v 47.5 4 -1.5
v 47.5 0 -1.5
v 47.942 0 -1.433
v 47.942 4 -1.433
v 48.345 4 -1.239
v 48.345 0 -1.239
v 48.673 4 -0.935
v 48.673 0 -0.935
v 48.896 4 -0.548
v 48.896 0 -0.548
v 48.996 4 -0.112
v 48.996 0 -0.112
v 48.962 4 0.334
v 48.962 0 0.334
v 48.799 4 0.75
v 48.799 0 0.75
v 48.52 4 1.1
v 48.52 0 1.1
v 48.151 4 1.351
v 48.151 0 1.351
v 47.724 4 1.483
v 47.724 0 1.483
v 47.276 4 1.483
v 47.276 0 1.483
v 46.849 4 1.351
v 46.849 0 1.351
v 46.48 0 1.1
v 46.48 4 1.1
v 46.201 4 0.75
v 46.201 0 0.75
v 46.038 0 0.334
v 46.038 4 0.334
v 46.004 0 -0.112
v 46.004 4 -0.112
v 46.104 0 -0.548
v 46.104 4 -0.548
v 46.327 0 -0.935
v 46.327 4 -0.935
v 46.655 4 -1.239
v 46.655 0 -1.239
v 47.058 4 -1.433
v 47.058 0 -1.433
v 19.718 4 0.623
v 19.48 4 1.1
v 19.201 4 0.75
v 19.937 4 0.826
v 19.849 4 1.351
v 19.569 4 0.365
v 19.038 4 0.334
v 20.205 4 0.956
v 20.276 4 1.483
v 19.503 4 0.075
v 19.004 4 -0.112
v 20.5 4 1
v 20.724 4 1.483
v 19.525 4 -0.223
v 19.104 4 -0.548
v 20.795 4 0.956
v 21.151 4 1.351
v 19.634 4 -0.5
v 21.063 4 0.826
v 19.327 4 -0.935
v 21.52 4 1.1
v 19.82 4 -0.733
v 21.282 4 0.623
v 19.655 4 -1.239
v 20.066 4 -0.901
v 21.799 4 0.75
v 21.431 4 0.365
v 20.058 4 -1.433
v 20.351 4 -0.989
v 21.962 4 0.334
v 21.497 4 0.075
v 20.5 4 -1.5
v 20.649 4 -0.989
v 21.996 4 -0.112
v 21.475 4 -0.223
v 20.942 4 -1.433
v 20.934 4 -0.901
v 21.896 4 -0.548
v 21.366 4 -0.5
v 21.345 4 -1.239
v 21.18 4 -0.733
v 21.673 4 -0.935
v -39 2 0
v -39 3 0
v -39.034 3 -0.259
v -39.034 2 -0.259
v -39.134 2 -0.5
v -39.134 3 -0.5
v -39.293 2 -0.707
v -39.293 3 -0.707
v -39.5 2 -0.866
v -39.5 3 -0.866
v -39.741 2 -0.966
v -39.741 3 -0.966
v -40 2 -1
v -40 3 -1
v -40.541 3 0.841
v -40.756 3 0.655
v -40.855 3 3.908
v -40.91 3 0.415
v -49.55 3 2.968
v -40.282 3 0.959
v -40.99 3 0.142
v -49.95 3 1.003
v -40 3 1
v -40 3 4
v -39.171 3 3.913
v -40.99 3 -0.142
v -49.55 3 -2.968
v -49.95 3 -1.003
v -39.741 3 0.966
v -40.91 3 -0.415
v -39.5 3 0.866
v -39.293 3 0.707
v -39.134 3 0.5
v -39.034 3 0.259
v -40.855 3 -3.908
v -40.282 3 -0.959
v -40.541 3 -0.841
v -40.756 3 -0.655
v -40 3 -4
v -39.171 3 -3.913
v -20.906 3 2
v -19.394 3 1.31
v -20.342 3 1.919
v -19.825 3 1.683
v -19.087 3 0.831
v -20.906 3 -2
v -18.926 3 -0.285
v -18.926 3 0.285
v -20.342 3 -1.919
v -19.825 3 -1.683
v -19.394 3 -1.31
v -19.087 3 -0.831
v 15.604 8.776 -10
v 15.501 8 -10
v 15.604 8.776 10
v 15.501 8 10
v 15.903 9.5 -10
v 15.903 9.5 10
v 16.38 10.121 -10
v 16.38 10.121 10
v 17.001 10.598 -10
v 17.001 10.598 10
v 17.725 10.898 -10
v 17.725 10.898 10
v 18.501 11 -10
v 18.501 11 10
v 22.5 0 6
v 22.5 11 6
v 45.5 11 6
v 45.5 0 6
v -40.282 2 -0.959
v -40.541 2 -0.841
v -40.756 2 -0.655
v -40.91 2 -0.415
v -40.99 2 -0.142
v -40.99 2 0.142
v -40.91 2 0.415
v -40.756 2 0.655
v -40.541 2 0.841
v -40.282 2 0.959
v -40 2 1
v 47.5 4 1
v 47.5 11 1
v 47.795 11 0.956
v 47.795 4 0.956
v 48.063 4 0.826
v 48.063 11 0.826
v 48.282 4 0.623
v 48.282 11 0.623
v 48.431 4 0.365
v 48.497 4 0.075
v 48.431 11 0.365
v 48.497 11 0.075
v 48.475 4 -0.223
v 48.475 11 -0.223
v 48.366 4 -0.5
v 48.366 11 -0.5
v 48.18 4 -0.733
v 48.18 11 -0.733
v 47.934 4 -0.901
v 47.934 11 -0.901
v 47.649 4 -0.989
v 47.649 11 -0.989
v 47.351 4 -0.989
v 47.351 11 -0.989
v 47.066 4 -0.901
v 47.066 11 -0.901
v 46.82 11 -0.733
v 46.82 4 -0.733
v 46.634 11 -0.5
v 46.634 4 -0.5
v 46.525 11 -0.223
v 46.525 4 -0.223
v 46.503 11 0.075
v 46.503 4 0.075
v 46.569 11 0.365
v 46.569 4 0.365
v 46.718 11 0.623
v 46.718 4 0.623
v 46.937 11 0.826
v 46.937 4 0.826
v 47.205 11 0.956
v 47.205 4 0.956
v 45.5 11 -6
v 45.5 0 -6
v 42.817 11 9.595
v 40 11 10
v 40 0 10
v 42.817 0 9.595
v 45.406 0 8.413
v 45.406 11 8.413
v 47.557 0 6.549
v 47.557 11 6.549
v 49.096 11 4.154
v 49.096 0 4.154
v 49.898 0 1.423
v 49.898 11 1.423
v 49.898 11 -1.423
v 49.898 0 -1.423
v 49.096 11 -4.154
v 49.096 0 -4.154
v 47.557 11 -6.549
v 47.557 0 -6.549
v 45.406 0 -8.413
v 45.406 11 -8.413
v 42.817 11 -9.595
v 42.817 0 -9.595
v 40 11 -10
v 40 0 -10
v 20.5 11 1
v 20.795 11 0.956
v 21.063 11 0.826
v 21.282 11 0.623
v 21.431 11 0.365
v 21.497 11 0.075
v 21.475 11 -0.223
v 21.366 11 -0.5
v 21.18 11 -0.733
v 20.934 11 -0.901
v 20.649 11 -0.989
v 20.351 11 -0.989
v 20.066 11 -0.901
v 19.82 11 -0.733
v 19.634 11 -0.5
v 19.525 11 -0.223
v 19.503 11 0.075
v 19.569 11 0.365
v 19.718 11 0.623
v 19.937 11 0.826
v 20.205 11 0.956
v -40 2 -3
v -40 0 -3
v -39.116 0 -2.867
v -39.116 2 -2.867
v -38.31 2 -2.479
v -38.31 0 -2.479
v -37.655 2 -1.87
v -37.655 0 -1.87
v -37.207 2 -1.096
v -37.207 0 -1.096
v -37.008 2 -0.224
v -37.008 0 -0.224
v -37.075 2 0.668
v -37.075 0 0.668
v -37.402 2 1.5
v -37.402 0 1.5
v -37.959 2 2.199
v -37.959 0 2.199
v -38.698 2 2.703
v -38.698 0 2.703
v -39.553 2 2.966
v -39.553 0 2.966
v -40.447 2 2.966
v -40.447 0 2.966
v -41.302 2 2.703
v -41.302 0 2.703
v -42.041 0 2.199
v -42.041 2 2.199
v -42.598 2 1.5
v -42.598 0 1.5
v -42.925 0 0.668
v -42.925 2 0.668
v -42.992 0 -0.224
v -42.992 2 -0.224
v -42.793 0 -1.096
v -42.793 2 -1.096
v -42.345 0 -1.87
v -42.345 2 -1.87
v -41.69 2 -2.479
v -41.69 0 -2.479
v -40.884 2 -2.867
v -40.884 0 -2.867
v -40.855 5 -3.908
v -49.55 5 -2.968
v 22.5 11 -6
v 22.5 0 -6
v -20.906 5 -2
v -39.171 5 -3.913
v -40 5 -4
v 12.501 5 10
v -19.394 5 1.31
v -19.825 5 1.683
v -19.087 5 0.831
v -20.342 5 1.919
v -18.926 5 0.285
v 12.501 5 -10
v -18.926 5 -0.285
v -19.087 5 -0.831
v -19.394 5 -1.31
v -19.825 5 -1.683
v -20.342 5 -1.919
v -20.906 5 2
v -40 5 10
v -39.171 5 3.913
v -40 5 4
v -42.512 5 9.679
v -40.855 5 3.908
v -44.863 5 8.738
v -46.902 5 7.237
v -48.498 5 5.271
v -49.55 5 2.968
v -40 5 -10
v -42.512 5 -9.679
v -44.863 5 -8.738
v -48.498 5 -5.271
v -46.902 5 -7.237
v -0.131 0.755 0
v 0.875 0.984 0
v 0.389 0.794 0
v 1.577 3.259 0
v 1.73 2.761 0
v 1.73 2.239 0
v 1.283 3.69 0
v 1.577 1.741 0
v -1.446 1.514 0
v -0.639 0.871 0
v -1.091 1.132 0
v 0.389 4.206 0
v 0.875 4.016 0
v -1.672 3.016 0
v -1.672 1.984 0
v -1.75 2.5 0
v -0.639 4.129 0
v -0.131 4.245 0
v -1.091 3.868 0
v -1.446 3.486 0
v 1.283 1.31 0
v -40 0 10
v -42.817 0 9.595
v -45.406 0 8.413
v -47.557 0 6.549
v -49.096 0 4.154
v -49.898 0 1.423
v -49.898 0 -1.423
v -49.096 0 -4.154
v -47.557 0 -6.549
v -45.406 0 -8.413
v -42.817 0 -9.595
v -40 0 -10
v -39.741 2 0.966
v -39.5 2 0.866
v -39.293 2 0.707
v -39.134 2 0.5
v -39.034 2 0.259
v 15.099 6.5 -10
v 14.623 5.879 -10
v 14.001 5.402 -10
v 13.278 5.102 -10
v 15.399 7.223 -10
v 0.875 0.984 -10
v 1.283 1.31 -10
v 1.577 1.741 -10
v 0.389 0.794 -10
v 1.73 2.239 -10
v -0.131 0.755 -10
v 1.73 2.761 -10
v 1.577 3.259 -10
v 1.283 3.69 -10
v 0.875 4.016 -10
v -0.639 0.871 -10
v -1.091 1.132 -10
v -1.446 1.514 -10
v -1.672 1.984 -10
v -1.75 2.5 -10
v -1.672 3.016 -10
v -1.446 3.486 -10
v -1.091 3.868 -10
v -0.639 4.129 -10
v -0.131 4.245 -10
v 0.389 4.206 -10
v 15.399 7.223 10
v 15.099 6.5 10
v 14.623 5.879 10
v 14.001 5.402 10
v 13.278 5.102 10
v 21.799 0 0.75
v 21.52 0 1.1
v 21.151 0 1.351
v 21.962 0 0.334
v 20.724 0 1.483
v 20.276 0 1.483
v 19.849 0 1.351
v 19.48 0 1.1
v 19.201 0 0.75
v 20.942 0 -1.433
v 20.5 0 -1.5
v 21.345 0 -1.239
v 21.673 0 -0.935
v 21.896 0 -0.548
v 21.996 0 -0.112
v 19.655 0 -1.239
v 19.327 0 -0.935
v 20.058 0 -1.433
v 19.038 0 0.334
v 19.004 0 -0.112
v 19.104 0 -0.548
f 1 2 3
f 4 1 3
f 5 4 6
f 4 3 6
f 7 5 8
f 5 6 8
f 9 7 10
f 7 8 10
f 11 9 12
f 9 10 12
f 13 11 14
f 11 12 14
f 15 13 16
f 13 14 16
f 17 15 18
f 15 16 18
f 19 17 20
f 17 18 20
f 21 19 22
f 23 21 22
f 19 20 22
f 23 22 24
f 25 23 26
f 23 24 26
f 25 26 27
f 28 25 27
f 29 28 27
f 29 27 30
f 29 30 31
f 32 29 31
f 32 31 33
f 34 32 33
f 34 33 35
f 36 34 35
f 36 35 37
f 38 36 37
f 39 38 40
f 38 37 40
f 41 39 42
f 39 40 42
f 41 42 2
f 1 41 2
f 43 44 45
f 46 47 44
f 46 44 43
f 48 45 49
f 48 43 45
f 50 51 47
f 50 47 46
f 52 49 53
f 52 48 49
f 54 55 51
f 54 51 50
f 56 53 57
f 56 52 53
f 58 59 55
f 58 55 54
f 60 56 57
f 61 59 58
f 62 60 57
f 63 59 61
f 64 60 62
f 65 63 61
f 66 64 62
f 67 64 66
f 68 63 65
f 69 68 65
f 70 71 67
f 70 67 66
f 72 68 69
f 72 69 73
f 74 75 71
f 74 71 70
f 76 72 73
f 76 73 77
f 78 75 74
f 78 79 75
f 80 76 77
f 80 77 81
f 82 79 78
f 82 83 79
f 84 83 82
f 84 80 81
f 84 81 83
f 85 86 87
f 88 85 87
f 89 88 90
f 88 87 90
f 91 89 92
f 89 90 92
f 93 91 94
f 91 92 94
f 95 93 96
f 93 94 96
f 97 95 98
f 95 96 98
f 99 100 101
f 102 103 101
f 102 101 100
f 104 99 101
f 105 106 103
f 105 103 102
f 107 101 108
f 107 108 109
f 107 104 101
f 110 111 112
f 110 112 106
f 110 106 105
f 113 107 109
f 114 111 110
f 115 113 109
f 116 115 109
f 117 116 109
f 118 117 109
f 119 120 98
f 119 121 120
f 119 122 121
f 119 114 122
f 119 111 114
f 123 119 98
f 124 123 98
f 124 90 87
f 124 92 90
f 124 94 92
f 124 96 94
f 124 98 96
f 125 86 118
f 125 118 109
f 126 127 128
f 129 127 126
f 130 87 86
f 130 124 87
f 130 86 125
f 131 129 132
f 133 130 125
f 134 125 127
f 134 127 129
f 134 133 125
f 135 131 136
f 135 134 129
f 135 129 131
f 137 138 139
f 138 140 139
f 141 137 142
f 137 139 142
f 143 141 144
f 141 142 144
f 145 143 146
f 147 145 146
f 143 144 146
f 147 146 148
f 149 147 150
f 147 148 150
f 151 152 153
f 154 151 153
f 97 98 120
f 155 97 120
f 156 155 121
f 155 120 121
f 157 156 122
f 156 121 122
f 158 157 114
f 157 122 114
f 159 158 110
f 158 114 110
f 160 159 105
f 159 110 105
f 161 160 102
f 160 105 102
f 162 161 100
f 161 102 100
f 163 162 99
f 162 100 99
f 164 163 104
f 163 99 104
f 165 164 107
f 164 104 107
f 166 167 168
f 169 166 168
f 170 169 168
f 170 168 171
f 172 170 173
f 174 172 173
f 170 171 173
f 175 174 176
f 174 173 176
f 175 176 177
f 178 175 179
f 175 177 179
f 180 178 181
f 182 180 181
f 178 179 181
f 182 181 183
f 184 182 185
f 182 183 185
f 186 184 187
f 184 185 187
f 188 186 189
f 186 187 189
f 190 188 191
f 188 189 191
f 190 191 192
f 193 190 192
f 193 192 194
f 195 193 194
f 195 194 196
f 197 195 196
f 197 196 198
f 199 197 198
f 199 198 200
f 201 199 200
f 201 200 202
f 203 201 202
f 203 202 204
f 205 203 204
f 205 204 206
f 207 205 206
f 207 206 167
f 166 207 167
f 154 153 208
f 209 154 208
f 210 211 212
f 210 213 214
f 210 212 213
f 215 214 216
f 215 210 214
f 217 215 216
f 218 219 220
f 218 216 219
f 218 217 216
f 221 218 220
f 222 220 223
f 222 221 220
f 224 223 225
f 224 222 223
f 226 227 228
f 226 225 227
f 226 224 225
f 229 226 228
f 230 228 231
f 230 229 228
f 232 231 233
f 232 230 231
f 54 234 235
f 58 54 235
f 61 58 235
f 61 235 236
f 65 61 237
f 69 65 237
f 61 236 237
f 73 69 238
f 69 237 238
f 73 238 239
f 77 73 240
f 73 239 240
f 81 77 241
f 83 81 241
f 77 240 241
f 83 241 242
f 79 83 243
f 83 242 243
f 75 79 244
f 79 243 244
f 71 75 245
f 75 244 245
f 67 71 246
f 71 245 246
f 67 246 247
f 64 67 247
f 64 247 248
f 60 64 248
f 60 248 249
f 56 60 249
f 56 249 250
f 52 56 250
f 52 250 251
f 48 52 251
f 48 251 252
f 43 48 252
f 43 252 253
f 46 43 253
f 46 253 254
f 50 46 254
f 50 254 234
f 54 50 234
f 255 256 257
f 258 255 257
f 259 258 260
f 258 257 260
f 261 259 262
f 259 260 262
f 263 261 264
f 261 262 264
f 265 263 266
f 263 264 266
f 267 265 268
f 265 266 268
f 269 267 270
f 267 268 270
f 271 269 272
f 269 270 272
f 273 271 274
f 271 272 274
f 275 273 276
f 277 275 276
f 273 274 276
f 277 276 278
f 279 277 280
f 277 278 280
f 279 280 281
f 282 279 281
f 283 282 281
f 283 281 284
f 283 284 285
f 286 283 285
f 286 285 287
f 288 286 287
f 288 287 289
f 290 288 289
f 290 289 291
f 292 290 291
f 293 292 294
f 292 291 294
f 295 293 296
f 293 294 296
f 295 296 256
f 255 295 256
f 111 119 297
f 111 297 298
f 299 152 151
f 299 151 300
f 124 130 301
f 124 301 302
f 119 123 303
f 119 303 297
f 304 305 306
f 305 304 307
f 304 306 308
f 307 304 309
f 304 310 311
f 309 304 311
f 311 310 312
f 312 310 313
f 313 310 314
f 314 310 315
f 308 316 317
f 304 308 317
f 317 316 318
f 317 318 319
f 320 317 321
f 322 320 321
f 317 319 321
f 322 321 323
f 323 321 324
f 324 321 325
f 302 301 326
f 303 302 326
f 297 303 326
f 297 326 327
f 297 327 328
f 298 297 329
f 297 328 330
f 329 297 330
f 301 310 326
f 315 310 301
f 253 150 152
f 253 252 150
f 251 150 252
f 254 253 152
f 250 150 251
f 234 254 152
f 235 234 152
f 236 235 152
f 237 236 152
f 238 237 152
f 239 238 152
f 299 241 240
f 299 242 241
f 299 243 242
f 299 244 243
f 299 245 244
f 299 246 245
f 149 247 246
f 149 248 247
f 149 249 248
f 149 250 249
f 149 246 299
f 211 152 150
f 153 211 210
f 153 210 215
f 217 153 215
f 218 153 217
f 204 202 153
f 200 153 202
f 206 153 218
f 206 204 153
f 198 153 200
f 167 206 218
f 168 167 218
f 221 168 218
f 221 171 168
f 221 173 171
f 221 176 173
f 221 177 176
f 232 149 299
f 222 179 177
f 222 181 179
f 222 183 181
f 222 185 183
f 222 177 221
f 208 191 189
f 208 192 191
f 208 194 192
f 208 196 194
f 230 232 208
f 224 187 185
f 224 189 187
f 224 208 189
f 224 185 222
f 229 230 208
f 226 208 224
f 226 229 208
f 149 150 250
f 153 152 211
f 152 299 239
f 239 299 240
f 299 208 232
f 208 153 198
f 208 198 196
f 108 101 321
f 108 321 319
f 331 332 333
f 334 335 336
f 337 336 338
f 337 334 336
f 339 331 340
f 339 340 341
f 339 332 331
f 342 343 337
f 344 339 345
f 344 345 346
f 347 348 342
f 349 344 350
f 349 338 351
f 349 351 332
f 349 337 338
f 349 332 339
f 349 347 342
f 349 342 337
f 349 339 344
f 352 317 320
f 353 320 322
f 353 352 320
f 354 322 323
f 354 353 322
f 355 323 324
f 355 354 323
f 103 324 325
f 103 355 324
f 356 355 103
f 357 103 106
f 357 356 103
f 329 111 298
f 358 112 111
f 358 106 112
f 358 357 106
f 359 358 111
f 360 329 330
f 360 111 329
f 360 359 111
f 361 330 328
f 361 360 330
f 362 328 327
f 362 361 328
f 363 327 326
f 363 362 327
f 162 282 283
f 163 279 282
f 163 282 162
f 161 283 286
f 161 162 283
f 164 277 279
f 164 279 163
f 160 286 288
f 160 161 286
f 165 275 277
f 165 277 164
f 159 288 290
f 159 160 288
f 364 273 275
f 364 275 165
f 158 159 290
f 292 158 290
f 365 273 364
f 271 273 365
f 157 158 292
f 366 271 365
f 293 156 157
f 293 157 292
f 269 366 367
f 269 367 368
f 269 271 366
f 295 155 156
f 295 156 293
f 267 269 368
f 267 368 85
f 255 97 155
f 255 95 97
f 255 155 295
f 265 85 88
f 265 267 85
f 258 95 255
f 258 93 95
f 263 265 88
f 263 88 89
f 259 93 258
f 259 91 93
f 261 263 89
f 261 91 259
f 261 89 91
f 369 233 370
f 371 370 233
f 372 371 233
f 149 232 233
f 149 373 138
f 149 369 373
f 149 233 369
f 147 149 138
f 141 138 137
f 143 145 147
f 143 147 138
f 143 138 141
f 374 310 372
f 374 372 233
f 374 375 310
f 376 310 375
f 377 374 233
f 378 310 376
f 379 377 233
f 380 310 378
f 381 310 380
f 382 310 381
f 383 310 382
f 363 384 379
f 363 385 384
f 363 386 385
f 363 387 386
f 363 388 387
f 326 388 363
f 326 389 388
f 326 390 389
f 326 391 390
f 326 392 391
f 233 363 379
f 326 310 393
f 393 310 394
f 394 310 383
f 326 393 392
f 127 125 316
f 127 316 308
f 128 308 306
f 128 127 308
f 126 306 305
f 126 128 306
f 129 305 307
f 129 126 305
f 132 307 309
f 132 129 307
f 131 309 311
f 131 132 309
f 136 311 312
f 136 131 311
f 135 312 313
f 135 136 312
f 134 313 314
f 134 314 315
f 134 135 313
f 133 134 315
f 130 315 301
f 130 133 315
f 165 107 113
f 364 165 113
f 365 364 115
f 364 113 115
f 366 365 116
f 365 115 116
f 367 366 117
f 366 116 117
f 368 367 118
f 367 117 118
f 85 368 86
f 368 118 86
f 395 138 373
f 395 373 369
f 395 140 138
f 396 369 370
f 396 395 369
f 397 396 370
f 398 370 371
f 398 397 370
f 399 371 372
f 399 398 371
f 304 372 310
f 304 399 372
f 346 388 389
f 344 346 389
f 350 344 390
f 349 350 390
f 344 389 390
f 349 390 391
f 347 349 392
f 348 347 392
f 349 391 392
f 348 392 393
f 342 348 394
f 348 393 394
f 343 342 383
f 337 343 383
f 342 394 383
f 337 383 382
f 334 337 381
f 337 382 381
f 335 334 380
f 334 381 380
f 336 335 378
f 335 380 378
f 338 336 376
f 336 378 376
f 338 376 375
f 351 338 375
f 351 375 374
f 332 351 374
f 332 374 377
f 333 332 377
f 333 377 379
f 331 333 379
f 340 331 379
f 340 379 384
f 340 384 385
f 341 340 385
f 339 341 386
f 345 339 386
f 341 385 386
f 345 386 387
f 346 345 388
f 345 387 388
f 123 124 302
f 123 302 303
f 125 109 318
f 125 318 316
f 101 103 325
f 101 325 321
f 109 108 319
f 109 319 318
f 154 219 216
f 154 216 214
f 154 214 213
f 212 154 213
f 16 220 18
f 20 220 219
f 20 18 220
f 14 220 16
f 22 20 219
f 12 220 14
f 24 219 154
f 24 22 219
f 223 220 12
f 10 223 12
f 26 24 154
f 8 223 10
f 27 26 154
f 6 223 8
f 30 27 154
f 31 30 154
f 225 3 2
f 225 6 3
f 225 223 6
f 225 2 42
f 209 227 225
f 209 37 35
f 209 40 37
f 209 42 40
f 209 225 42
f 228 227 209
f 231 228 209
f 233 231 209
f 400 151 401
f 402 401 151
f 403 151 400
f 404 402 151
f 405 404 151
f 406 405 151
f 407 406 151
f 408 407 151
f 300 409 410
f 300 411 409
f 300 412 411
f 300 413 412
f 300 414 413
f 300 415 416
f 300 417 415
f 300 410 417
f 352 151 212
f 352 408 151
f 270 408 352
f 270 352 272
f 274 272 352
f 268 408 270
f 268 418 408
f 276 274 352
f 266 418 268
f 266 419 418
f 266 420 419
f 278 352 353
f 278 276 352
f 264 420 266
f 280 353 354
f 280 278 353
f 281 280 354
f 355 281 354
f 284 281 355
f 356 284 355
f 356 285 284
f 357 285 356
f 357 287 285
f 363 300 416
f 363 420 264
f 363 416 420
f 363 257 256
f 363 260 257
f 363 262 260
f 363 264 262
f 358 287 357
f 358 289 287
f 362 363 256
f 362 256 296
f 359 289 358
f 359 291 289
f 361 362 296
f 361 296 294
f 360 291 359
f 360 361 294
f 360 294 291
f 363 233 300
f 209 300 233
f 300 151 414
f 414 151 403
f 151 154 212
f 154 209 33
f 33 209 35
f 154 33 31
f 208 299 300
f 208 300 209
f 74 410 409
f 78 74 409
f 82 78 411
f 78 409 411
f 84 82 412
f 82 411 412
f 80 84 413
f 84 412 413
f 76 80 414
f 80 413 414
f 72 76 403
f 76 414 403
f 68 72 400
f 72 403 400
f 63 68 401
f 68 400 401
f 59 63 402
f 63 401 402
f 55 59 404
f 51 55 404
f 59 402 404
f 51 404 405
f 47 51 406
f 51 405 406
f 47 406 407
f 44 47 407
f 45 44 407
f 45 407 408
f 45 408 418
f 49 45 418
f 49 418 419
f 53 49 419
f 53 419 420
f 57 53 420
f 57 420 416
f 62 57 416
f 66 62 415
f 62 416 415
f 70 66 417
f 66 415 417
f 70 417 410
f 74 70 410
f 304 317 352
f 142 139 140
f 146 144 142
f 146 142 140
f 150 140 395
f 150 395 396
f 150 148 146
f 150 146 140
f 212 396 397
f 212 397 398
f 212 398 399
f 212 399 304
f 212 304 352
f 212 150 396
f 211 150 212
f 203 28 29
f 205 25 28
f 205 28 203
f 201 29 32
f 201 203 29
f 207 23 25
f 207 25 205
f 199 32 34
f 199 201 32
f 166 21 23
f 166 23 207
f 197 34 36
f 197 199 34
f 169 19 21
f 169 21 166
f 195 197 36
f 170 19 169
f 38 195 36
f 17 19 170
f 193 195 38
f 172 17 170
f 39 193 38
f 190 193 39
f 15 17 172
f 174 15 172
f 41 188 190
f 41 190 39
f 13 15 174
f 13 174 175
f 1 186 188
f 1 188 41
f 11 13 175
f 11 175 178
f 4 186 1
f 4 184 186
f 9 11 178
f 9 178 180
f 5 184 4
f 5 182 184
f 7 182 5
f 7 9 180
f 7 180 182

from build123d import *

# Parameters (mm, degrees)
BOSS_EXTRUDE1_DEPTH = 5
CUT_EXTRUDE1_START  = -2
CUT_EXTRUDE1_DEPTH  = 2
CUT_EXTRUDE2_DEPTH  = 52.23475383
SKETCH4_R           = 3
CUT_EXTRUDE3_DEPTH  = 2
SKETCH5_W           = 17.5
SKETCH5_H           = 12
SKETCH5_W_2         = 5.5
SKETCH5_R           = 1
CUT_EXTRUDE4_DEPTH  = 52.23475383
BOSS_EXTRUDE2_START = 6
SKETCH6_R           = 1
SKETCH6_W           = 23
SKETCH6_H           = 12
BOSS_EXTRUDE2_DEPTH = 6
FILLET1_R           = 3
FILLET2_R           = 3
SKETCH7_R           = 1.5
CUT_EXTRUDE5_DEPTH  = 4
SKETCH8_R           = 1.75
CUT_EXTRUDE6_DEPTH  = 10


with BuildPart() as part:
    # Sketch1 → Boss-Extrude1 (new body)
    with BuildSketch(Plane(origin=(0, 0, 0), x_dir=(1, 0, 0), z_dir=(0, 1, 0))):
        with BuildLine():
            Line((-40, 10), (40, 10))
            ThreePointArc((40, 10), (50, 0), (40, -10))
            Line((40, -10), (-40, -10))
            ThreePointArc((-40, -10), (-50, 0), (-40, 10))
        make_face()
    extrude(amount=BOSS_EXTRUDE1_DEPTH)

    # Sketch2 → Cut-Extrude1 (cut)
    with BuildSketch(Plane(origin=(0, 5, 0), x_dir=(1, 0, 0), z_dir=(0, 1, 0)).offset(CUT_EXTRUDE1_START)):
        with BuildLine():
            Line((-39.171140726, 3.913181864), (-40, 4))
            Line((-40, 4), (-40.854873646, 3.907581227))
            Line((-40.854873646, 3.907581227), (-49.549514718, 2.96762003))
            ThreePointArc((-49.549514718, 2.96762003), (-50, 0), (-49.549514718, -2.96762003))
            Line((-49.549514718, -2.96762003), (-40.854873646, -3.907581227))
            Line((-40.854873646, -3.907581227), (-40, -4))
            Line((-40, -4), (-39.171140726, -3.913181864))
            Line((-39.171140726, -3.913181864), (-20.905849501, -2))
            ThreePointArc((-20.905849501, -2), (-18.905849501, 0), (-20.905849501, 2))
            Line((-20.905849501, 2), (-39.171140726, 3.913181864))
        make_face()
    extrude(amount=CUT_EXTRUDE1_DEPTH, mode=Mode.SUBTRACT)

    # Sketch3 → Cut-Extrude2 (cut, through all)
    with BuildSketch(Plane(origin=(0, 5, 0), x_dir=(1, 0, 0), z_dir=(0, 1, 0))):
        with BuildLine():
            ThreePointArc((-39, 0), (-39.292893219, 0.707106781), (-40, 1))
            Line((-40, 1), (-40, -1))
            ThreePointArc((-40, -1), (-39.292893219, -0.707106781), (-39, 0))
        make_face()
        with BuildLine():
            Line((-40, -1), (-40, 1))
            ThreePointArc((-40, 1), (-41, 0), (-40, -1))
        make_face()
    extrude(amount=-CUT_EXTRUDE2_DEPTH, mode=Mode.SUBTRACT)

    # Sketch4 → Cut-Extrude3 (cut)
    with BuildSketch(Plane.XZ):
        with Locations(Location((-40, 0, 0), (0, 0, 270))):
            Circle(SKETCH4_R)
    extrude(amount=-CUT_EXTRUDE3_DEPTH, mode=Mode.SUBTRACT)

    # Sketch5 → Cut-Extrude4 (cut, through all)
    with BuildSketch(Plane(origin=(0, 5, 0), x_dir=(1, 0, 0), z_dir=(0, 1, 0))):
        with Locations((31.25, 0)):
            Rectangle(SKETCH5_W, SKETCH5_H)
        with Locations((42.75, 0)):
            Rectangle(SKETCH5_W_2, SKETCH5_H)
        with Locations(Location((47.5, 0, 0), (0, 0, 270))):
            Circle(SKETCH5_R)
        with Locations(Location((20.5, 0, 0), (0, 0, 270))):
            Circle(SKETCH5_R)
    extrude(amount=-CUT_EXTRUDE4_DEPTH, mode=Mode.SUBTRACT)

    # Sketch6 → Boss-Extrude2 (add)
    with BuildSketch(Plane(origin=(0, 5, 0), x_dir=(1, 0, 0), z_dir=(0, 1, 0)).offset(BOSS_EXTRUDE2_START)):
        with BuildLine():
            Line((15.501327646, 10), (15.501327646, -10))
            Line((15.501327646, -10), (40, -10))
            ThreePointArc((40, -10), (50, 0), (40, 10))
            Line((40, 10), (15.501327646, 10))
        make_face()
        with Locations(Location((20.5, 0, 0), (0, 0, 270))):
            Circle(SKETCH6_R, mode=Mode.SUBTRACT)
        with Locations(Location((47.5, 0, 0), (0, 0, 270))):
            Circle(SKETCH6_R, mode=Mode.SUBTRACT)
        with Locations((34, 0)):
            Rectangle(SKETCH6_W, SKETCH6_H, mode=Mode.SUBTRACT)
    extrude(amount=-BOSS_EXTRUDE2_DEPTH)

    # Fillet1
    fillet1_edges = [part.edges().sort_by_distance(p)[0] for p in [
        (15.501327646, 11, 0),
    ]]
    fillet(fillet1_edges, radius=FILLET1_R)

    # Fillet2
    fillet2_edges = [part.edges().sort_by_distance(p)[0] for p in [
        (15.501327646, 5, 0),
    ]]
    fillet(fillet2_edges, radius=FILLET2_R - 0.0001)  # a hair under: the kernel refuses the full size

    # Sketch7 → Cut-Extrude5 (cut)
    with BuildSketch(Plane.XZ):
        with Locations(Location((20.5, 0, 0), (0, 0, 270))):
            Circle(SKETCH7_R)
        with Locations(Location((47.5, 0, 0), (0, 0, 270))):
            Circle(SKETCH7_R)
    extrude(amount=-CUT_EXTRUDE5_DEPTH, mode=Mode.SUBTRACT)

    # Sketch8 → Cut-Extrude6 (cut)
    with BuildSketch(Plane(origin=(0, 0, -10), x_dir=(-1, 0, 0), z_dir=(0, 0, -1))):
        with Locations((0, 2.5)):
            Circle(SKETCH8_R)
    extrude(amount=-CUT_EXTRUDE6_DEPTH, mode=Mode.SUBTRACT)


solid = part.part
